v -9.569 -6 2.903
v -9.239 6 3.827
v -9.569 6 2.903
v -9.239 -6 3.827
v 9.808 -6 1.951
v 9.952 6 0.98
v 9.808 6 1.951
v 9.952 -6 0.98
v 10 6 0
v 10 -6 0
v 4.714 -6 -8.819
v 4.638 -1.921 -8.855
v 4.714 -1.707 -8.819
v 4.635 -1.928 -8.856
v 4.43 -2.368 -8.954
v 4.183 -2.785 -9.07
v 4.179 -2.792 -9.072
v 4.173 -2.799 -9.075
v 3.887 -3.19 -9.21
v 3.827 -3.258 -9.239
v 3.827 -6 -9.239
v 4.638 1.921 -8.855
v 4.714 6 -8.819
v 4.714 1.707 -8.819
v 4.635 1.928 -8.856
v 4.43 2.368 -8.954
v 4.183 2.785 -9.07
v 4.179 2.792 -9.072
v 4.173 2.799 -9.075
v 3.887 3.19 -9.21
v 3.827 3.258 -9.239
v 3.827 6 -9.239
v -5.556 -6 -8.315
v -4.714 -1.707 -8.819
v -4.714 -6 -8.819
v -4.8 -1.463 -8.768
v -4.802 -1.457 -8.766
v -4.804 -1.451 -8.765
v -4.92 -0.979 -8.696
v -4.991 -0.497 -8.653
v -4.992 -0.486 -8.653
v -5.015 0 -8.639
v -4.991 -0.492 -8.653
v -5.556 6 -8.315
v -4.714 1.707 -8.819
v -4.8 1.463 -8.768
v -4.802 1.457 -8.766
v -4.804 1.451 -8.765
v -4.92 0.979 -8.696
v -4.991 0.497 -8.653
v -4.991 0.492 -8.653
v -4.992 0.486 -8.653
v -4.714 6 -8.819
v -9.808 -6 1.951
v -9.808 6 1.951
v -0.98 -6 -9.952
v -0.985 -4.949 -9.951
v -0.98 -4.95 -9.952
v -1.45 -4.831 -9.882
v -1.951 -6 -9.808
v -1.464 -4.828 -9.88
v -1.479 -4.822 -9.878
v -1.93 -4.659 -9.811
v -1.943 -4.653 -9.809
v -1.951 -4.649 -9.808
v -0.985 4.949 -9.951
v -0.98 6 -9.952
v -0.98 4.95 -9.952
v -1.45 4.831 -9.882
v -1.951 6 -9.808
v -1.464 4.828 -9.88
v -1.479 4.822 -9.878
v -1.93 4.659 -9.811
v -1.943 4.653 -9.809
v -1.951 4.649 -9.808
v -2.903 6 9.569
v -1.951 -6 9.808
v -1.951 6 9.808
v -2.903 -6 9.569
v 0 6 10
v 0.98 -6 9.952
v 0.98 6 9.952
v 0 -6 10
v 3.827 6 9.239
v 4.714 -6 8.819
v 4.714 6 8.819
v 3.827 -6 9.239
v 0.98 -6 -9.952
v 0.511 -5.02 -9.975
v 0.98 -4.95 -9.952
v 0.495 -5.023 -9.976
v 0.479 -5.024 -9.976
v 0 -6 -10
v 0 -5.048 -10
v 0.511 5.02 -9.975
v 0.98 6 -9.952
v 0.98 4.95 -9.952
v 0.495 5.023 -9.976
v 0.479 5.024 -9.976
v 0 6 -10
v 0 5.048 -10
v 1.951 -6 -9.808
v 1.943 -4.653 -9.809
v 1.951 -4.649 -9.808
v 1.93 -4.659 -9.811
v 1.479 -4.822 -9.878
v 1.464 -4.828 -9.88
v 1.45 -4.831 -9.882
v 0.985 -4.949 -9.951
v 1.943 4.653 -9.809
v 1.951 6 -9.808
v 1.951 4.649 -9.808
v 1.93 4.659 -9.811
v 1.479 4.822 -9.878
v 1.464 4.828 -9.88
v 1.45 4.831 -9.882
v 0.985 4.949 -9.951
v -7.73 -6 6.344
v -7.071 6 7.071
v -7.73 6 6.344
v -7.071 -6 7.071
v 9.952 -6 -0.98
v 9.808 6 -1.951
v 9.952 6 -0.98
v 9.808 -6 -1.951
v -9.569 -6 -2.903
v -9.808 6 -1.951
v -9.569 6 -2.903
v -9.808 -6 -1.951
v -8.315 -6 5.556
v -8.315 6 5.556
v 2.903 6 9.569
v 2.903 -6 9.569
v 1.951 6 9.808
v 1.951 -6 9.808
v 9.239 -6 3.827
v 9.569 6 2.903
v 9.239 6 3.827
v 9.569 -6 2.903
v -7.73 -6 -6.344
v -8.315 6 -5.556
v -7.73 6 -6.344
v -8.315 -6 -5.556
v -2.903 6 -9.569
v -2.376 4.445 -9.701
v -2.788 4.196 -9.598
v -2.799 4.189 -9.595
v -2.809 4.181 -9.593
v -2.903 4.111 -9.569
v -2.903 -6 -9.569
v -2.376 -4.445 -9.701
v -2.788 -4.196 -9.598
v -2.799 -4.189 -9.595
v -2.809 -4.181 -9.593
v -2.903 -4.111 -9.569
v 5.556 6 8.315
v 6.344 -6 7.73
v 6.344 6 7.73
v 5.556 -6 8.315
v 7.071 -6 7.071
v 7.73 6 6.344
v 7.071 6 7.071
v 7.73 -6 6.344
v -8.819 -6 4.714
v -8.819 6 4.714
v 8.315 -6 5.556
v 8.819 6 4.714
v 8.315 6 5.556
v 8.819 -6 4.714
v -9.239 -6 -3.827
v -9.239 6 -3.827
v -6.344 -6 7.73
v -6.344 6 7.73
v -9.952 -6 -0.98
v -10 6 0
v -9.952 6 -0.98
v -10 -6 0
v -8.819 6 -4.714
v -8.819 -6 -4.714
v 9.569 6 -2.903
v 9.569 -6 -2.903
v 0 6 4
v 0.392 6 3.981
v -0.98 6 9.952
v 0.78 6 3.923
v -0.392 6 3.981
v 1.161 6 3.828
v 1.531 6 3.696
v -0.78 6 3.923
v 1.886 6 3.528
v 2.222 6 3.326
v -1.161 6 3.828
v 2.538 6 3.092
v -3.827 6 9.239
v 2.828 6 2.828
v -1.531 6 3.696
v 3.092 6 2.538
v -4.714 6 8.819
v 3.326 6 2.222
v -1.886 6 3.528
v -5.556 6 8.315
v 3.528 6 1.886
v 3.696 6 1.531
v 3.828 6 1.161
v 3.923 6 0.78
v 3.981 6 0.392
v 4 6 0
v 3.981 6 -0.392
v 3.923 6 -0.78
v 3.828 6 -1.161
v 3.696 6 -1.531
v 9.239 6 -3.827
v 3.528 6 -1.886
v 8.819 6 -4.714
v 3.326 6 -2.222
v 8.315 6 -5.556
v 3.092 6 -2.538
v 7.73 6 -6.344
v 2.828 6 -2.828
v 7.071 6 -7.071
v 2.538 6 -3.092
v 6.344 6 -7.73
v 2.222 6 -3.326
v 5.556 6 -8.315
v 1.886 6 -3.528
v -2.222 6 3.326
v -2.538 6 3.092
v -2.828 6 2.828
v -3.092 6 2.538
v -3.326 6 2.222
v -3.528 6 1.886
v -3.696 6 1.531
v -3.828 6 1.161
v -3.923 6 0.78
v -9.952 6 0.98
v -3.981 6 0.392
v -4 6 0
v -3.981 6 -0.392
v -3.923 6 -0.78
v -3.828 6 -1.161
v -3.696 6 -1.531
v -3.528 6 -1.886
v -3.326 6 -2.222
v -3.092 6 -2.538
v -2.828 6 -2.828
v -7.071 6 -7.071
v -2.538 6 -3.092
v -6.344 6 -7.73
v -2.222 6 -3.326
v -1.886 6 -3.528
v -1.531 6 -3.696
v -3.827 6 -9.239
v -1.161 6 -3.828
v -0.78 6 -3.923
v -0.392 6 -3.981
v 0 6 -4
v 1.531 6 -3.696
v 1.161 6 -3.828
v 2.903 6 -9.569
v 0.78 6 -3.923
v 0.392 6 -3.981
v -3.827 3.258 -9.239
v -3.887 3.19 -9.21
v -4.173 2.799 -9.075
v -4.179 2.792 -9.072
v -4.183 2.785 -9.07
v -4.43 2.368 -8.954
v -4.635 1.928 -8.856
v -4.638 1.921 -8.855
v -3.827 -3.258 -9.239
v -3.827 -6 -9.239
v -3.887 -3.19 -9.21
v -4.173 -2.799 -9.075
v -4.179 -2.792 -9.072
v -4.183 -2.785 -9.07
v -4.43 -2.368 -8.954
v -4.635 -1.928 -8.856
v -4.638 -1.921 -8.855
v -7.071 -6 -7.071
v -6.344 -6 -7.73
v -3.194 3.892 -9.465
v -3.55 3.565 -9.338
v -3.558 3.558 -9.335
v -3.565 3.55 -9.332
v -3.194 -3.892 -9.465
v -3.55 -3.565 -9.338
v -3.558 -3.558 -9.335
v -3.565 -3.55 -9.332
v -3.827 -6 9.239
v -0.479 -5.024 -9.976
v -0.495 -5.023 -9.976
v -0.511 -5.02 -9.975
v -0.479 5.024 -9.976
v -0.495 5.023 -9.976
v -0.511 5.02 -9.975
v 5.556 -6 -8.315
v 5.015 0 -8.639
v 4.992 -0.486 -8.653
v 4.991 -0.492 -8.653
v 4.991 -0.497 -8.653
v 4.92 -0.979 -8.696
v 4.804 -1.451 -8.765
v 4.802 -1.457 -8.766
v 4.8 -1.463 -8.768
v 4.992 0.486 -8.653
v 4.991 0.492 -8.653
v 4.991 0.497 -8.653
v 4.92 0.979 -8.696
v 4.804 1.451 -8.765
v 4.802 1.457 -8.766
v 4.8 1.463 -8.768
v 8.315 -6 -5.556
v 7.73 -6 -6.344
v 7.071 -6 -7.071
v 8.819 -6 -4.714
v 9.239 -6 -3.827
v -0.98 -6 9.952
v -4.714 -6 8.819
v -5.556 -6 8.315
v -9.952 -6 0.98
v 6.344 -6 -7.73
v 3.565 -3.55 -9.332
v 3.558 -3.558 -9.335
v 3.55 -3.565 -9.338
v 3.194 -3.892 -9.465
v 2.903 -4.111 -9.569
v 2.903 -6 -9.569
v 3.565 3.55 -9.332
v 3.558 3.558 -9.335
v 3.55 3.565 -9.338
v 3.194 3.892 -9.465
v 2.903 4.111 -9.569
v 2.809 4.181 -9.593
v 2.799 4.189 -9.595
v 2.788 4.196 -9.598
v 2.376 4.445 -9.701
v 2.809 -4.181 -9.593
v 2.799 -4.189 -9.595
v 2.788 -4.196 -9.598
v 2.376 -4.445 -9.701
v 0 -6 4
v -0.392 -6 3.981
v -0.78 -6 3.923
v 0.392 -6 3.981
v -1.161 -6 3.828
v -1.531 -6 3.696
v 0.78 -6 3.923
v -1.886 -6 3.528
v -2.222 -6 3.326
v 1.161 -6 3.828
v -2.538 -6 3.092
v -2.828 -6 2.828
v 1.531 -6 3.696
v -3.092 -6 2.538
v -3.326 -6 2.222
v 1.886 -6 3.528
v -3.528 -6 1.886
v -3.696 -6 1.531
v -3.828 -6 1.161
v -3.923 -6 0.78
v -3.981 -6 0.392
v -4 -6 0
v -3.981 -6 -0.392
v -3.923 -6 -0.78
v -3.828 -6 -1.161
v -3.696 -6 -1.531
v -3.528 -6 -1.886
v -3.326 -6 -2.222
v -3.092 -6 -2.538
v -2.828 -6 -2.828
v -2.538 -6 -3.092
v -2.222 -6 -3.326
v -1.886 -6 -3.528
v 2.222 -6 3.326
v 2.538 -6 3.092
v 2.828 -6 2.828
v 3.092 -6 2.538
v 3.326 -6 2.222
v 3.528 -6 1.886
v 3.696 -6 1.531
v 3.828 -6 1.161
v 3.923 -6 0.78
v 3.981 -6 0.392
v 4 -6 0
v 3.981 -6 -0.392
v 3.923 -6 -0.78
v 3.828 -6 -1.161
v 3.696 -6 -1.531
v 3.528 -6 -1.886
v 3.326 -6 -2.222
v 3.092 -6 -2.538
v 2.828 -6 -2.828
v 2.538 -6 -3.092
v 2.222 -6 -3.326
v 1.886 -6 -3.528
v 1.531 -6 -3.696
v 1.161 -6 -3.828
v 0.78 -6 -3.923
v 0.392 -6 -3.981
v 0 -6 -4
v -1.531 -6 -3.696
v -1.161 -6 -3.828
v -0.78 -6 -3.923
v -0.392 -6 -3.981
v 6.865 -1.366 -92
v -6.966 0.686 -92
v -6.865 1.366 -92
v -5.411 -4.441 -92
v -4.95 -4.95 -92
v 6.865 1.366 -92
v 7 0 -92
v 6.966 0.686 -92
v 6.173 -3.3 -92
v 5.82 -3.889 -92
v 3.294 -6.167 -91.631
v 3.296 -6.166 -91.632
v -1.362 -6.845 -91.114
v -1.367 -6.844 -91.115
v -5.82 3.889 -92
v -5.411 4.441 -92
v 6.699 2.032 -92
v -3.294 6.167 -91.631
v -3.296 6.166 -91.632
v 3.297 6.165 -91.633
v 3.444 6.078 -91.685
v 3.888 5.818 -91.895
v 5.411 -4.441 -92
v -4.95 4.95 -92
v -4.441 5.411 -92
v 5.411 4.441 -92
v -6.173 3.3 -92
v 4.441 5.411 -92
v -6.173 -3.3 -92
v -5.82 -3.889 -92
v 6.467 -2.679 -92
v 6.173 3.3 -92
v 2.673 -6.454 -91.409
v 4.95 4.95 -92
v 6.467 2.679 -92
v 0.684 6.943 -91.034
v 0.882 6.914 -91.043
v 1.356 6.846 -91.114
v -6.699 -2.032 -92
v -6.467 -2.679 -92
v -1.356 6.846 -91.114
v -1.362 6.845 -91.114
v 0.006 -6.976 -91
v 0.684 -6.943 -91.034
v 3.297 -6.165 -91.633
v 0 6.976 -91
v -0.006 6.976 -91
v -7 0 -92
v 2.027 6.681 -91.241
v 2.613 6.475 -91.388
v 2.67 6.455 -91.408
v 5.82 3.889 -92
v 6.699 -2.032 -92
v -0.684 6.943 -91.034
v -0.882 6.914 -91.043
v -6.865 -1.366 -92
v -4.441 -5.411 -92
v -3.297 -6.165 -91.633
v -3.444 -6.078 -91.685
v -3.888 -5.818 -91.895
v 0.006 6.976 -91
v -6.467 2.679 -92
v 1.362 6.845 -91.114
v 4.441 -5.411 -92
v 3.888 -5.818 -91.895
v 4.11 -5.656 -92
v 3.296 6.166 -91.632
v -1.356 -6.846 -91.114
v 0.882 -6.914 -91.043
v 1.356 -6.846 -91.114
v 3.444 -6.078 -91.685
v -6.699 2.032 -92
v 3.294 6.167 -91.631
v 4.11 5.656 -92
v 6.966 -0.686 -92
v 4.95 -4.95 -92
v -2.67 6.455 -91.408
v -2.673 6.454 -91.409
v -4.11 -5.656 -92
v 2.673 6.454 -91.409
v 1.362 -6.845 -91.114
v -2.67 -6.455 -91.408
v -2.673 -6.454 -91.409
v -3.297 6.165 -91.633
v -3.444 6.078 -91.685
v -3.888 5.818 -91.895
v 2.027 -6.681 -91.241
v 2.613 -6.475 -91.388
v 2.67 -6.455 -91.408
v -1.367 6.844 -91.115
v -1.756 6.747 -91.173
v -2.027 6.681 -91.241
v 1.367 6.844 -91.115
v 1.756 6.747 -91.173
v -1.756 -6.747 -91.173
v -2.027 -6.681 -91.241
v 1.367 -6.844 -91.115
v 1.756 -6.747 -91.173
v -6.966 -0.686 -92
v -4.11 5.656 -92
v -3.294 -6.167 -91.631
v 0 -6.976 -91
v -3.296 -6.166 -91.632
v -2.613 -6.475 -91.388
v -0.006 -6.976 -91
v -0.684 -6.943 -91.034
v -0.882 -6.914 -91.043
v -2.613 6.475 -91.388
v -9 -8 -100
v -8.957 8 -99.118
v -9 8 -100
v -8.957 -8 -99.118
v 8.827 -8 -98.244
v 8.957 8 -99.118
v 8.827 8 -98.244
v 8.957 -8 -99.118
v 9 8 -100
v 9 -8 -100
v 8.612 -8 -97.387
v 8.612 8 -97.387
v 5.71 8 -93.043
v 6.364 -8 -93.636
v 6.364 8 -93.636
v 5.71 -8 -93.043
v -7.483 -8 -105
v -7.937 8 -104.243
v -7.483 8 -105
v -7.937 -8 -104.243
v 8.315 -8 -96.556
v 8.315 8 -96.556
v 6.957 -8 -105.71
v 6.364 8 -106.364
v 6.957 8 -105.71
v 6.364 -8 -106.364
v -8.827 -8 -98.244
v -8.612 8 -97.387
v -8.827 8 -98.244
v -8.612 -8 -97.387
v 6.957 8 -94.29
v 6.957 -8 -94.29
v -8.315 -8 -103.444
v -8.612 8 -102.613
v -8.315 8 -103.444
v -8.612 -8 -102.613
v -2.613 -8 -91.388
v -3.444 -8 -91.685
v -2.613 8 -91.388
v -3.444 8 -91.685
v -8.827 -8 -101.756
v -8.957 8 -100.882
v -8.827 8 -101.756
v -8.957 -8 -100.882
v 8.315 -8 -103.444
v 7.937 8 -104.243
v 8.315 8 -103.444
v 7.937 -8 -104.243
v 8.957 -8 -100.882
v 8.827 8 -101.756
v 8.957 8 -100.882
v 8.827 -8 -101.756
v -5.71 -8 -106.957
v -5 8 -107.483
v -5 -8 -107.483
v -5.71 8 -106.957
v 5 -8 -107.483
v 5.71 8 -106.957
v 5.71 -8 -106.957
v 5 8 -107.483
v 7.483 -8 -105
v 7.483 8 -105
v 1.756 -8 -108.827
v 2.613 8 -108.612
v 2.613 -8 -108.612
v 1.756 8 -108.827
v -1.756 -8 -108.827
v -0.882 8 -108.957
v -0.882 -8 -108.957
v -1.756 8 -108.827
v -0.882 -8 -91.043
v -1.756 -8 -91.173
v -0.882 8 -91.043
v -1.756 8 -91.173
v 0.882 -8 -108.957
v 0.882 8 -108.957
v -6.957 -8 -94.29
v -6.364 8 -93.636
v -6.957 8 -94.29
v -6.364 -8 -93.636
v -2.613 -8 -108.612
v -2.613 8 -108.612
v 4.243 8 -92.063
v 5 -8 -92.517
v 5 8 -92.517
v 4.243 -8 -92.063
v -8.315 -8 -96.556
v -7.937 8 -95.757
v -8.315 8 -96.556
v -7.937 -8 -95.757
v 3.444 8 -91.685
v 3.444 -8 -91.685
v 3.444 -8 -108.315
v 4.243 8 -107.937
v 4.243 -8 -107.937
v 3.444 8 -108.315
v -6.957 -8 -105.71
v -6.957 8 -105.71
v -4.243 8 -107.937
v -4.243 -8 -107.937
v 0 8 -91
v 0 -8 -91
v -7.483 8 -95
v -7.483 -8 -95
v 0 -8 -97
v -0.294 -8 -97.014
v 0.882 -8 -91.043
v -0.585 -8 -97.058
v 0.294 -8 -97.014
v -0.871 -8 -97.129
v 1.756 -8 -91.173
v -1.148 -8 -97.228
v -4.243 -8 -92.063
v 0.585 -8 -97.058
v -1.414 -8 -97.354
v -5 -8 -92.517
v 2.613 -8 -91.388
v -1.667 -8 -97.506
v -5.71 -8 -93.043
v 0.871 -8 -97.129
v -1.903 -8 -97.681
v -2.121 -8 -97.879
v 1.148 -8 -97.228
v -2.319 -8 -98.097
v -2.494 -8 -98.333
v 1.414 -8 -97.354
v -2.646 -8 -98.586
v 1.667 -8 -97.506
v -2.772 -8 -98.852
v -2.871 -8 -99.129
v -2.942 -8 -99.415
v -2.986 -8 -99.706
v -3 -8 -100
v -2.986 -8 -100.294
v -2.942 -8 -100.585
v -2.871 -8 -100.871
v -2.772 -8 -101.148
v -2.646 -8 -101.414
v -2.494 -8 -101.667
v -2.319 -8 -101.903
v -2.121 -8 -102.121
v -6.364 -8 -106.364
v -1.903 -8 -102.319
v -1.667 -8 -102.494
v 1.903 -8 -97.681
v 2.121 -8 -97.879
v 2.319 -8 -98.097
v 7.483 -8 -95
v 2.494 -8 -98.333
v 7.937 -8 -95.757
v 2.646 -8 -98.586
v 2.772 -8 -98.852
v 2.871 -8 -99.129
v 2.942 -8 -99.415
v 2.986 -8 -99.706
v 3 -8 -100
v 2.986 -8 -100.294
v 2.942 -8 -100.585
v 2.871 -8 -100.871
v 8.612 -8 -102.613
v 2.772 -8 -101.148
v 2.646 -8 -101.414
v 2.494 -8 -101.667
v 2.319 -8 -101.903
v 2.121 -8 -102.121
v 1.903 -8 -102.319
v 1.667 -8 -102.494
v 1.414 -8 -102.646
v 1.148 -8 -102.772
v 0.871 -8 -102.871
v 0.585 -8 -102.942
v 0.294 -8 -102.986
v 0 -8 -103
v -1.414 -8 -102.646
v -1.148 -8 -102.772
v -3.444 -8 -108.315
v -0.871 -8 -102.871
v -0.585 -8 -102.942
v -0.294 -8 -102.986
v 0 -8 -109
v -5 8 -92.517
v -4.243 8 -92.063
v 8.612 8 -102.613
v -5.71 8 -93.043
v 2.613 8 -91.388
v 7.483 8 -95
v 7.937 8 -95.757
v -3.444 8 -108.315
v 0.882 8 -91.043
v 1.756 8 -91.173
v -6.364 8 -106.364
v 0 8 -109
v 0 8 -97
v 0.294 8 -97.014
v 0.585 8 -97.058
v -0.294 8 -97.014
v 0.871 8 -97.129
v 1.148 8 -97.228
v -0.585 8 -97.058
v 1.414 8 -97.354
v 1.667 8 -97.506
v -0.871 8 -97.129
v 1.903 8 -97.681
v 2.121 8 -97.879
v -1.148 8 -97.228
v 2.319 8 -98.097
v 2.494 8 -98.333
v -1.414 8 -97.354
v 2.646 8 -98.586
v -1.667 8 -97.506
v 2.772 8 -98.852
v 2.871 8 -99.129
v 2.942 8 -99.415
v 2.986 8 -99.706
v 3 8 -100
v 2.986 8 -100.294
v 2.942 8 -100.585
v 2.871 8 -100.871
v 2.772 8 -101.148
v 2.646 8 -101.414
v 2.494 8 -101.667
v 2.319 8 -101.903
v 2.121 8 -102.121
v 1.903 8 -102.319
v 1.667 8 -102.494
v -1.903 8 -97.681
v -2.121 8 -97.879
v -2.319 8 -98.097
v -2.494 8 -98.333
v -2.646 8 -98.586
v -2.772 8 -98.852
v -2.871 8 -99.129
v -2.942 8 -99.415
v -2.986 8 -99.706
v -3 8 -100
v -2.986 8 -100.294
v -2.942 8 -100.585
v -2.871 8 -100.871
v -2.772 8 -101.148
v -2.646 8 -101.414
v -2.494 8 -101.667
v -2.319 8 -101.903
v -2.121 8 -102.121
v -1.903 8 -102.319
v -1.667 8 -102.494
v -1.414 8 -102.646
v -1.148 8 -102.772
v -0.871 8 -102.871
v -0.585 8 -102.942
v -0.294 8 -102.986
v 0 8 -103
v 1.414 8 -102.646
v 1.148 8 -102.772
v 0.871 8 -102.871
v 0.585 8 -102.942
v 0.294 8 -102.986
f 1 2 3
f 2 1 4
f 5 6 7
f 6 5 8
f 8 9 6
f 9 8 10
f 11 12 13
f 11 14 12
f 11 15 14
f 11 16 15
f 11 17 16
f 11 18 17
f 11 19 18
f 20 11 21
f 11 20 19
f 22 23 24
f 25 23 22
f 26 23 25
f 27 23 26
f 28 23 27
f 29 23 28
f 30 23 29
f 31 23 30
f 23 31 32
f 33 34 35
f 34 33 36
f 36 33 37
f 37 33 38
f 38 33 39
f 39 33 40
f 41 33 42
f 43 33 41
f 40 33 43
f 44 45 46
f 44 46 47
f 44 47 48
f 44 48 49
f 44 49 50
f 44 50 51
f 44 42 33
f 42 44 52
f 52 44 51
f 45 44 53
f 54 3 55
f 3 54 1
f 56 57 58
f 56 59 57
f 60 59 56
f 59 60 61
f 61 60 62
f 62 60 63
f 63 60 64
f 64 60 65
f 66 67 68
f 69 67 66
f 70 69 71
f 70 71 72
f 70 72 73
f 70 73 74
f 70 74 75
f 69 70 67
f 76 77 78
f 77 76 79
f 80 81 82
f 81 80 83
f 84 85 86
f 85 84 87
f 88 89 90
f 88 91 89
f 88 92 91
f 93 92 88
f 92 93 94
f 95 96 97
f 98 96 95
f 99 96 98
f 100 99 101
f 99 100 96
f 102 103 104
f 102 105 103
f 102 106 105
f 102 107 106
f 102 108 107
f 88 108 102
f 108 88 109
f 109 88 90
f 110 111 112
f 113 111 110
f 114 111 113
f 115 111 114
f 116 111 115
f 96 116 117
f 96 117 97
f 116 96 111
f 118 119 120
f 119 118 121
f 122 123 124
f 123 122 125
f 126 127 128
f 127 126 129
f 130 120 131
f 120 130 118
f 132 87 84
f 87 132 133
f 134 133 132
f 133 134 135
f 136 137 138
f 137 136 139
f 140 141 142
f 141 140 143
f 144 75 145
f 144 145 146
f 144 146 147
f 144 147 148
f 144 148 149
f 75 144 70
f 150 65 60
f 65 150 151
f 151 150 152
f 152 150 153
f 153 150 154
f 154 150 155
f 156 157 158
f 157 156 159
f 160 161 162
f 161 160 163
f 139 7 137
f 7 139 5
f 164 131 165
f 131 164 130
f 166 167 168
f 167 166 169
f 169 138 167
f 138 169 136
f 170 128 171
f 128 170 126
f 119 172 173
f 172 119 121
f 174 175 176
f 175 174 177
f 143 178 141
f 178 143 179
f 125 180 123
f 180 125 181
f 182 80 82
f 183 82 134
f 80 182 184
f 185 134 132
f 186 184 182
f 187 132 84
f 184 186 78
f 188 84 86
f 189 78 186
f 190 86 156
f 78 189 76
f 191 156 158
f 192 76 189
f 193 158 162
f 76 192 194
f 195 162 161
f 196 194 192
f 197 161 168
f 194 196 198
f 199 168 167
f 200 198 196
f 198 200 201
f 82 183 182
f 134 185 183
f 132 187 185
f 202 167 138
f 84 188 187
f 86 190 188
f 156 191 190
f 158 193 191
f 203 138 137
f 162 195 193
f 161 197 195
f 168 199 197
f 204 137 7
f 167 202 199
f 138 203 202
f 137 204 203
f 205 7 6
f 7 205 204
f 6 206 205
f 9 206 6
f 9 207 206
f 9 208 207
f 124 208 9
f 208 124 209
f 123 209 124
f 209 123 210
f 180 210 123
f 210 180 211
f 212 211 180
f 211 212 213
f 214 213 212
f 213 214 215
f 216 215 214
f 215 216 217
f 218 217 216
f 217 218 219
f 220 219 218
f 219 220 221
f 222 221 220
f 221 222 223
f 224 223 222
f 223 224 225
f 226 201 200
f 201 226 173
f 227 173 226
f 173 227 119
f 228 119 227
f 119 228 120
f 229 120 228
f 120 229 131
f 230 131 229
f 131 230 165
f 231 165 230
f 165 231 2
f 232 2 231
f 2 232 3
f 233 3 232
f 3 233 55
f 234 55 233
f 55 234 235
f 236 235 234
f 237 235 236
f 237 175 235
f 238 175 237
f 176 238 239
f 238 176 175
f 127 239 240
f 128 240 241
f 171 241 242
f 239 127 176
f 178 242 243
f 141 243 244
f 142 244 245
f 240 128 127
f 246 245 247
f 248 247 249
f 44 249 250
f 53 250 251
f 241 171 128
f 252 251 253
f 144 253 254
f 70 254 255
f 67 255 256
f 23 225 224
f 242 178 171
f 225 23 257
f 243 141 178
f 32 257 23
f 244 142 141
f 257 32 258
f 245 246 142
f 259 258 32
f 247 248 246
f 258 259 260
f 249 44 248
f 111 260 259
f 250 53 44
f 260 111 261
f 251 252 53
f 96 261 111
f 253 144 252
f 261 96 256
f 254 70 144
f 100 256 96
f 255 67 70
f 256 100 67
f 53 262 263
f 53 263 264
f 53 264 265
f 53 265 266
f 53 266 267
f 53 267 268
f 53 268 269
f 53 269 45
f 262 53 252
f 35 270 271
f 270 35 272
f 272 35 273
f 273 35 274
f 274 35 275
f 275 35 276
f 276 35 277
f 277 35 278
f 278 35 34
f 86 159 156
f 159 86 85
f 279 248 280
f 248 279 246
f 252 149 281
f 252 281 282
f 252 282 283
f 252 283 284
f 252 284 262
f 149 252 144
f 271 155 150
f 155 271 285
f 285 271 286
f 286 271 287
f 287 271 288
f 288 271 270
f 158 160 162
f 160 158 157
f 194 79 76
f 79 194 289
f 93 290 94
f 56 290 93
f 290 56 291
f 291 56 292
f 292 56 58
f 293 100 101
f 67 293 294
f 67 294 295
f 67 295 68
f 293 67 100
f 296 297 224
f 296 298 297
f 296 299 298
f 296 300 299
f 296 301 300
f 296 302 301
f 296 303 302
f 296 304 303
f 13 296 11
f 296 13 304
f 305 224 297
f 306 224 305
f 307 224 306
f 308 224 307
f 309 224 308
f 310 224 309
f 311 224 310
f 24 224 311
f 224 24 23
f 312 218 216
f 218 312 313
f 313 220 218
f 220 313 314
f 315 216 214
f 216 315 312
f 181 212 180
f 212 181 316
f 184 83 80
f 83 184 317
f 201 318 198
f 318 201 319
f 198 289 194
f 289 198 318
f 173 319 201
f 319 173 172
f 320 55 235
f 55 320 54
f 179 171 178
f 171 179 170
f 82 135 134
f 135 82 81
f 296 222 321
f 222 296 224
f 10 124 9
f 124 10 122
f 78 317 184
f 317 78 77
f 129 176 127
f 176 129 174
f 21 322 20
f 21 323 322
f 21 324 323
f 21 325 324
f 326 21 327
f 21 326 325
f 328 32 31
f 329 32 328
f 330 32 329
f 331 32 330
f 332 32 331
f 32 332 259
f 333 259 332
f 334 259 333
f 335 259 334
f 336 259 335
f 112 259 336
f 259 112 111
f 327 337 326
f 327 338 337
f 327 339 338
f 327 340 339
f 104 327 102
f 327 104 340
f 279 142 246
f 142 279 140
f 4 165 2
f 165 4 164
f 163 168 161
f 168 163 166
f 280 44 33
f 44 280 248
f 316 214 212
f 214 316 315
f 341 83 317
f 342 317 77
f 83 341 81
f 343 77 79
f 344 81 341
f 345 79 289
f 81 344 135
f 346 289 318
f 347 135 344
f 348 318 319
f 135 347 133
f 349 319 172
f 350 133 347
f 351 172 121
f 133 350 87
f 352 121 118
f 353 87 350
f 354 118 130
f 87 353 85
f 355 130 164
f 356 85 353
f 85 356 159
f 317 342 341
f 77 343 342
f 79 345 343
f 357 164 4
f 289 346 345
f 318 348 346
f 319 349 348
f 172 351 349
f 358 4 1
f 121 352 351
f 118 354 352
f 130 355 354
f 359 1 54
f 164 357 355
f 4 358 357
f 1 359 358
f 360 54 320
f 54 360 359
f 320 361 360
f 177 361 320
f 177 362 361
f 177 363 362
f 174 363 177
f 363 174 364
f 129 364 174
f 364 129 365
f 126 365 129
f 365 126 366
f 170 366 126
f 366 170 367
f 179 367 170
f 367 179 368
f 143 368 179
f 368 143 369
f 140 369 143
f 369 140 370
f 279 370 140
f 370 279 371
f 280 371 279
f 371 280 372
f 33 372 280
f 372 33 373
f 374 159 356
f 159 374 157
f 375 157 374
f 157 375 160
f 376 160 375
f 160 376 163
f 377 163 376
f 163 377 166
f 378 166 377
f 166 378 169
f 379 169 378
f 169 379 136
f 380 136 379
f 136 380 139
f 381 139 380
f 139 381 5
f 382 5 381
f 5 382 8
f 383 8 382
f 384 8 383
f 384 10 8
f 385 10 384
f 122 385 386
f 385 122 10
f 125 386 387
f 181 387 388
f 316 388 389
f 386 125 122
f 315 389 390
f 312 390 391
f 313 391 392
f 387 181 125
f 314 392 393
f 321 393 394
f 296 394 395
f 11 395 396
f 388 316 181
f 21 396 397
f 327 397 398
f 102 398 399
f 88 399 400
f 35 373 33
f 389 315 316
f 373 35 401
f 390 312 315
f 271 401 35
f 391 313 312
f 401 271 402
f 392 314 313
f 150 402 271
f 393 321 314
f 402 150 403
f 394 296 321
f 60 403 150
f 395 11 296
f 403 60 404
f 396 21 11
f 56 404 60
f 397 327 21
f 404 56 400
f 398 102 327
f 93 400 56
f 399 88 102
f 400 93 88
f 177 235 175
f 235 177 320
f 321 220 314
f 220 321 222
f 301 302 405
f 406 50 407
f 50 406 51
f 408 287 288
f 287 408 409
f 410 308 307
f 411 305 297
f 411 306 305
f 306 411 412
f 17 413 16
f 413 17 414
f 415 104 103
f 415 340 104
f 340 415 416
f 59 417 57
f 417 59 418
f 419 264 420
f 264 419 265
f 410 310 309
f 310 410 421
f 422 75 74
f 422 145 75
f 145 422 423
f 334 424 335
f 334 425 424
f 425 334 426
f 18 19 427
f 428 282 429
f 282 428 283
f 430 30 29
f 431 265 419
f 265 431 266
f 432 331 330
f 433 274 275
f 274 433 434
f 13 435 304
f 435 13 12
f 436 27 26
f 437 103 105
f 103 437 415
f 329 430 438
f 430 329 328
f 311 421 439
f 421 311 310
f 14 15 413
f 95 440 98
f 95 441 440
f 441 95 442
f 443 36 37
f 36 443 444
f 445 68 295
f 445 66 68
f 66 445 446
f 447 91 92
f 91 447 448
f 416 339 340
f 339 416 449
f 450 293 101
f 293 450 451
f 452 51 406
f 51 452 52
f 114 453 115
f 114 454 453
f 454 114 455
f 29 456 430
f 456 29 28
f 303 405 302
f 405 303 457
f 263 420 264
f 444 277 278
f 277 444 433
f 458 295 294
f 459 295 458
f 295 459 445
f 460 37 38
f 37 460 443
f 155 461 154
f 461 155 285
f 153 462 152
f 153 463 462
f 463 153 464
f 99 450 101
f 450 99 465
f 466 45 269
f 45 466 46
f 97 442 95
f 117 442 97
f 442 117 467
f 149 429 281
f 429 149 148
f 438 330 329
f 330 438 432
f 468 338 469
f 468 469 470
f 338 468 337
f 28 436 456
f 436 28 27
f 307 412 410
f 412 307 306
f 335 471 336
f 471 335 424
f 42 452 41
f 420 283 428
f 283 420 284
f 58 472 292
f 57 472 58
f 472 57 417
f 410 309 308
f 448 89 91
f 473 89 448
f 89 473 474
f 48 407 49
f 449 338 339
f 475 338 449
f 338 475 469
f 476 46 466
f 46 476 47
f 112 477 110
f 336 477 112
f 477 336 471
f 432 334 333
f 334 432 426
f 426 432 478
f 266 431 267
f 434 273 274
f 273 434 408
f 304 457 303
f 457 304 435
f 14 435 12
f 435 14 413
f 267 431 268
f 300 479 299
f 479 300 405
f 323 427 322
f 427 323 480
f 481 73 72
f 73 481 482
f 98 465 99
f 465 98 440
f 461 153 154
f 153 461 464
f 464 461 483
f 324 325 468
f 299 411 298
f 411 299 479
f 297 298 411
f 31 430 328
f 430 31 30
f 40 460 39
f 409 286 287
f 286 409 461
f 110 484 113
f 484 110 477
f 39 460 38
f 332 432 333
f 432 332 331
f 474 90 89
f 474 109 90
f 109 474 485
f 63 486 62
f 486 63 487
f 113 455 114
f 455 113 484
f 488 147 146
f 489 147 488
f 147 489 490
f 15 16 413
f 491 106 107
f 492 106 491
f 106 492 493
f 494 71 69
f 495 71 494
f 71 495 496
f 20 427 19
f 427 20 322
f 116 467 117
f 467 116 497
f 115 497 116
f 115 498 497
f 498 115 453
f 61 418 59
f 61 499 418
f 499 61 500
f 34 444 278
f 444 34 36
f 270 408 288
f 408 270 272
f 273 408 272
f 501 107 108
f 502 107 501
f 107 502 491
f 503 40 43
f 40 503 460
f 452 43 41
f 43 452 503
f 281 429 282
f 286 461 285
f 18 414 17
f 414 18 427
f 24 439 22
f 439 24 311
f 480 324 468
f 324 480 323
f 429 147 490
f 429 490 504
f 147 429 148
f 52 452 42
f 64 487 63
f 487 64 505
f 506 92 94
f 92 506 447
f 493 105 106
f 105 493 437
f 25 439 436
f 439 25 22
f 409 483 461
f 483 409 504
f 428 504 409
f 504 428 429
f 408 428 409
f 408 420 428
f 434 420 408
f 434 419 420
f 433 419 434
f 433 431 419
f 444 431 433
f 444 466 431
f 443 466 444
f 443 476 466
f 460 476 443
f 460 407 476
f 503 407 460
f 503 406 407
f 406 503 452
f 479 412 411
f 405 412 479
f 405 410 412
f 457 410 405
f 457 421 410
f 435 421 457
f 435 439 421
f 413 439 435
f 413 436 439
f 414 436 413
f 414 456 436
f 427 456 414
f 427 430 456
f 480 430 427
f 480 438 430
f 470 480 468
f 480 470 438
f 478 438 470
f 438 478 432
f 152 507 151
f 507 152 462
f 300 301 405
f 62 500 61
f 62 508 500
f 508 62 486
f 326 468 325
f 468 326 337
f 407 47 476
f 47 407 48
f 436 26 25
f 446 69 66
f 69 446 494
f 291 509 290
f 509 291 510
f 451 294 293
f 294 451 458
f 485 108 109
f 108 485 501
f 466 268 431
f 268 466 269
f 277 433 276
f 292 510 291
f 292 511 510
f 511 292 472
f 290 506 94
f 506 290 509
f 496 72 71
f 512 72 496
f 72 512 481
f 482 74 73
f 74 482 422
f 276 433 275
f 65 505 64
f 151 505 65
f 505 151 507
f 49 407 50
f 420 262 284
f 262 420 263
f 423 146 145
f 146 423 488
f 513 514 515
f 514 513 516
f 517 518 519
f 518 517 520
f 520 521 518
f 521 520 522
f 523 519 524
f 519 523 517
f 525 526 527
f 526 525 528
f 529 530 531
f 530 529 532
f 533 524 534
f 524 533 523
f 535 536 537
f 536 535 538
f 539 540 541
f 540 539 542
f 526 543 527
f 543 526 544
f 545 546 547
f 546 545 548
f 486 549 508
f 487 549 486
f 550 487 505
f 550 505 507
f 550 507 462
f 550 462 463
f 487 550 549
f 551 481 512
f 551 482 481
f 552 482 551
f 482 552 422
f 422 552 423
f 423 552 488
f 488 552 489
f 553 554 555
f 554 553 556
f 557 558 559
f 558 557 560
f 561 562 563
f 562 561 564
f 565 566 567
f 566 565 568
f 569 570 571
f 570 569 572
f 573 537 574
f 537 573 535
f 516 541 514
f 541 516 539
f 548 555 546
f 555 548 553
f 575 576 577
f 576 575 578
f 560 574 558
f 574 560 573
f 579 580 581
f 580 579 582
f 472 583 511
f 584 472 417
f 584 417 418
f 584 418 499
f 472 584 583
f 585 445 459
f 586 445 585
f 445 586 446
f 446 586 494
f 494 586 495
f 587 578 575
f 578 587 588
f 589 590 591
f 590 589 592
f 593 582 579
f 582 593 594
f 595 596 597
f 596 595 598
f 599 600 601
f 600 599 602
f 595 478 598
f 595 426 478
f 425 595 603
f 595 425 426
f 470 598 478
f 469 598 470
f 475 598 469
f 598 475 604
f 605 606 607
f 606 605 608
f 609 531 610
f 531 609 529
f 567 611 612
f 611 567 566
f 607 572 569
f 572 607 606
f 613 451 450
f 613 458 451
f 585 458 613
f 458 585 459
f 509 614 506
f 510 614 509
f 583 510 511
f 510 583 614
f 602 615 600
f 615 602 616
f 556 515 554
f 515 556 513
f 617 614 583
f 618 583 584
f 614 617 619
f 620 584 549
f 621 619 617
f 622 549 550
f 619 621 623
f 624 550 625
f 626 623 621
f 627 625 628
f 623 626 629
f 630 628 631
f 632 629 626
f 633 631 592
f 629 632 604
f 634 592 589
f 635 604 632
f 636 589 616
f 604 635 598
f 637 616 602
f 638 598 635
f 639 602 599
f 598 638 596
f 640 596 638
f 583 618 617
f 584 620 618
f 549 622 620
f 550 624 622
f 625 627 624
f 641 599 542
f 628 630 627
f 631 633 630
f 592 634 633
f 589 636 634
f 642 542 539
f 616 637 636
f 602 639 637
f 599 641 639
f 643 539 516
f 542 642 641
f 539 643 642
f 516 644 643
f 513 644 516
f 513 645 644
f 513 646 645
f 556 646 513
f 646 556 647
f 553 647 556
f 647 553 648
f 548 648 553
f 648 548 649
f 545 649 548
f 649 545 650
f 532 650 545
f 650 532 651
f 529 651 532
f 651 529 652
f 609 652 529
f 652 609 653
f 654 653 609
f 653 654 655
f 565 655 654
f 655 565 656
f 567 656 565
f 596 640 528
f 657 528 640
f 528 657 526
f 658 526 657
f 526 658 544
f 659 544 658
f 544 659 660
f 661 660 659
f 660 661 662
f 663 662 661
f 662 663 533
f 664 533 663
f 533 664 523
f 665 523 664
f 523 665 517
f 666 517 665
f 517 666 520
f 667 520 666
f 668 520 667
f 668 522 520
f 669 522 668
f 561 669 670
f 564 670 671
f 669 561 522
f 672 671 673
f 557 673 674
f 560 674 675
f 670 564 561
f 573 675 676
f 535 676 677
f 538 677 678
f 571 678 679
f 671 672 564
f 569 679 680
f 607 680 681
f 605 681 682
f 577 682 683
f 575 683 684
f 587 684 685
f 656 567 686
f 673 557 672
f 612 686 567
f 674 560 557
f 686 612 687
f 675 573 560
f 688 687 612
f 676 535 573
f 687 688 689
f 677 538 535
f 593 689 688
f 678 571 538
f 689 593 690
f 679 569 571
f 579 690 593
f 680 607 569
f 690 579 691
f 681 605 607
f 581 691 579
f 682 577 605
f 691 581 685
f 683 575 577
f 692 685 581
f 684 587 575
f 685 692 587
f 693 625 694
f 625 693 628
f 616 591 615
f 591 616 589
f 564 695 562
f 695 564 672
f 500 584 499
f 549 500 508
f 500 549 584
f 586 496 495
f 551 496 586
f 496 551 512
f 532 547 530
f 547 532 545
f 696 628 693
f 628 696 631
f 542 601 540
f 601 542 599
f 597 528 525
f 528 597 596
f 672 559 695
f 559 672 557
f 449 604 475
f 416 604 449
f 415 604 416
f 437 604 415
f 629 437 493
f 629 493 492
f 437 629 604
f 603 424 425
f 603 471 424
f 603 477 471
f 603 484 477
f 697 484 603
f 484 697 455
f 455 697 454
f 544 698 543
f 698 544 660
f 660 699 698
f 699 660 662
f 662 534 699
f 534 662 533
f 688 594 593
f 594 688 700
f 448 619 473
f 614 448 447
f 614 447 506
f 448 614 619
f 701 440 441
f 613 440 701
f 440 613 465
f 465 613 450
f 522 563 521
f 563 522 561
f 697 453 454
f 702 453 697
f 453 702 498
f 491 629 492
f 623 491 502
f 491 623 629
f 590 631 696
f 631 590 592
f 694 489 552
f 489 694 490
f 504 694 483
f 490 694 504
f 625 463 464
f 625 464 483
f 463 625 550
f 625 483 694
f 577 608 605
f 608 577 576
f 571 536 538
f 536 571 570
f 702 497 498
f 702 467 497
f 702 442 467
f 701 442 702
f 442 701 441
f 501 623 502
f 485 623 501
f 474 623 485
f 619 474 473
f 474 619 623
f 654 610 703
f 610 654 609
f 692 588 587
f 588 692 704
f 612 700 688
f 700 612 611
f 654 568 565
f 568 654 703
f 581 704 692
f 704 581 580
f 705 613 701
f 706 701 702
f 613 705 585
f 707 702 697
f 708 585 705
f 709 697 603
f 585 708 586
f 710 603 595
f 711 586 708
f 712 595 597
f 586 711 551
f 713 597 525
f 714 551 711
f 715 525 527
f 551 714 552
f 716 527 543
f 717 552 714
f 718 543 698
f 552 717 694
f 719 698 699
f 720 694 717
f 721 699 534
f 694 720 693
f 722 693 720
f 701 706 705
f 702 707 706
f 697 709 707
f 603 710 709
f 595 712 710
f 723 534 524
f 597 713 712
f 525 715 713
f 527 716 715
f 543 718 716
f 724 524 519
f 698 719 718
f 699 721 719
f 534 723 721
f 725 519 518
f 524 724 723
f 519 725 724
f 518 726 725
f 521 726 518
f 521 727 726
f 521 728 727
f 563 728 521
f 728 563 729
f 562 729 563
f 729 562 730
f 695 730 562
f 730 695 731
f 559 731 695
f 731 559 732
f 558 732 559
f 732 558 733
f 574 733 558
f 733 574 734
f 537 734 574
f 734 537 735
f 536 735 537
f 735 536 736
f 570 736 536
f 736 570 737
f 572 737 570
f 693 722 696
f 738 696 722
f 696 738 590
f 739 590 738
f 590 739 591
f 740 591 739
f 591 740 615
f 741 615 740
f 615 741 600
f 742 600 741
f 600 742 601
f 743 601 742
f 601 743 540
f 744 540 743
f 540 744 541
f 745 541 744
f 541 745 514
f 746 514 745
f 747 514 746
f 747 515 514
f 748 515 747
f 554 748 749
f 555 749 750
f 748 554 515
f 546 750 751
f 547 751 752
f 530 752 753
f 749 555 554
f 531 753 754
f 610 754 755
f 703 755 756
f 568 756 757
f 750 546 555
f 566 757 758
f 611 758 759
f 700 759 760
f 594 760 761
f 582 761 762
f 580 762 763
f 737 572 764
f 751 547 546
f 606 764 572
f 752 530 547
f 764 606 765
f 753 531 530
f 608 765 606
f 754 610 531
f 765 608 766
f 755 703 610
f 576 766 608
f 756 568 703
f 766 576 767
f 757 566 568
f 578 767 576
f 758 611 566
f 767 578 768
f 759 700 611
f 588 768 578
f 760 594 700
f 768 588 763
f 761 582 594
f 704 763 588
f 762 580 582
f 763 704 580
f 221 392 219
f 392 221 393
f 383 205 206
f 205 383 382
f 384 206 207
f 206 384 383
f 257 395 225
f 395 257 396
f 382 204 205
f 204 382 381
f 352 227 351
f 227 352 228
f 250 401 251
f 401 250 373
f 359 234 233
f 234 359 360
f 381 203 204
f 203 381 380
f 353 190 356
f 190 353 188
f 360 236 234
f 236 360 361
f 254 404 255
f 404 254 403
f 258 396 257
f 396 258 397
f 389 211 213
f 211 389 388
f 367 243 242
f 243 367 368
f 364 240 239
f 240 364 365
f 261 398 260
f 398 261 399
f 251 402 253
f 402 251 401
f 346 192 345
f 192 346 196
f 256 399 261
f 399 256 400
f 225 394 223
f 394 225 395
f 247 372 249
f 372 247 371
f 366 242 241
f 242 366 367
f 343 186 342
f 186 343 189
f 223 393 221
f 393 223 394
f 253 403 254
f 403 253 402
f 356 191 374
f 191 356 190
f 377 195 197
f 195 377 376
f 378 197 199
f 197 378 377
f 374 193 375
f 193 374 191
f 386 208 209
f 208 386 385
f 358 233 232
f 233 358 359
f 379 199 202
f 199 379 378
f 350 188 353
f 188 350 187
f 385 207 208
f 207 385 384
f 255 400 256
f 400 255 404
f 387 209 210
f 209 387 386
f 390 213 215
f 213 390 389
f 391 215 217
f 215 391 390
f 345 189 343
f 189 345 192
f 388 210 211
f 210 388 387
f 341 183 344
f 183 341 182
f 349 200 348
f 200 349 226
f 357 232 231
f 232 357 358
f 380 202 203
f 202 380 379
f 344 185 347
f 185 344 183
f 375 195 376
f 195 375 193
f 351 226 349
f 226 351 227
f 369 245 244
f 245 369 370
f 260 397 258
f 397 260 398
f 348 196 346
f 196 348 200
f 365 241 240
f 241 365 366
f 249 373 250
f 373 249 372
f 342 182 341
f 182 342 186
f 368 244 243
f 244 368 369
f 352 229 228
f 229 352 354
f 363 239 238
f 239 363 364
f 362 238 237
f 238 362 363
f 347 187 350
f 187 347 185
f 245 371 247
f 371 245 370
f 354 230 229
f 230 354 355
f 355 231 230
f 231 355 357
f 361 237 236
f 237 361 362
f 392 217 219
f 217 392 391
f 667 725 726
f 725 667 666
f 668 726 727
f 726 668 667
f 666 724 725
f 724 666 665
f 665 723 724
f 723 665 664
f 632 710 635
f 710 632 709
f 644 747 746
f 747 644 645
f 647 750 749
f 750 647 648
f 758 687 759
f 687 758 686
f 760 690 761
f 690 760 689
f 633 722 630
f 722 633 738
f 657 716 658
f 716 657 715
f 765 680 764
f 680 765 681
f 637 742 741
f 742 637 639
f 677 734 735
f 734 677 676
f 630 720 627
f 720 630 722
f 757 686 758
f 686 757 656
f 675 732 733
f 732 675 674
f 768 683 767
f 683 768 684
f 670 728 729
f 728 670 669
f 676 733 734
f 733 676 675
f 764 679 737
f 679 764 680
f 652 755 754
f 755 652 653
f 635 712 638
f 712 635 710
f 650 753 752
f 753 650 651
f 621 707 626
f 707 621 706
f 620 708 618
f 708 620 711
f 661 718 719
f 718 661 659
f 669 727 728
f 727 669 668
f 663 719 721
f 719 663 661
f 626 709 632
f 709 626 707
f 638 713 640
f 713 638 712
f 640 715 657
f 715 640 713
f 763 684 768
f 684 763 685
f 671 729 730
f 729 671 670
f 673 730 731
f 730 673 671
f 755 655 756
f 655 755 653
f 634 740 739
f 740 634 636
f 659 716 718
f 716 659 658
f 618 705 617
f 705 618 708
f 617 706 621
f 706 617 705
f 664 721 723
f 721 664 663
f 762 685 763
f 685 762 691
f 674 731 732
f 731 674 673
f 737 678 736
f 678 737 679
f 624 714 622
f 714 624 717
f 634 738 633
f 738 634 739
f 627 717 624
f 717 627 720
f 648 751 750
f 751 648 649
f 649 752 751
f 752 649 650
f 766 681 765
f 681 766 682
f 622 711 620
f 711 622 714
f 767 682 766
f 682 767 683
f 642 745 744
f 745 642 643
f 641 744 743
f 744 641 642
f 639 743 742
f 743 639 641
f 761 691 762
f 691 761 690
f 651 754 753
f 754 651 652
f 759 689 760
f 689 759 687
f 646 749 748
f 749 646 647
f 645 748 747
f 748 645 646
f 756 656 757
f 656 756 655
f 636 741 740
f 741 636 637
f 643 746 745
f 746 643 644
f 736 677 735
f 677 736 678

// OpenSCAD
// file: params.scad
$fn = 64;

femur_length_mm = 110;
tibia_length_mm = 100;

hip_hub_width_mm = 22;
hip_hub_radius_mm = 11;
hip_pin_dia_mm = 6;

femur_shaft_prox_dia_mm = 20;
femur_shaft_dist_dia_mm = 16;
femur_prox_offset_mm = 8;
femur_dist_offset_mm = 10;
femur_bridge_height_mm = 8;

knee_fork_gap_mm = 12;
knee_fork_plate_mm = 6;
knee_hub_radius_mm = 13;
knee_pin_dia_mm = 8;

tibia_hub_radius_mm = 10;
tibia_shaft_prox_dia_mm = 14;
tibia_shaft_dist_dia_mm = 10;
tibia_prox_offset_mm = 8;
tibia_dist_offset_mm = 8;

ankle_hub_radius_mm = 9;
ankle_hub_width_mm = 16;
ankle_pin_dia_mm = 6;

knee_angle_deg = 25;
hip_angle_deg = 0;
ankle_angle_deg = -(hip_angle_deg + knee_angle_deg);

hip_base_gap_mm = hip_hub_width_mm;
hip_base_plate_mm = 6;
hip_base_radius_mm = 15;
hip_base_tower_top_mm = 34;
hip_base_tower_width_x_mm = 26;
hip_base_mount_size_x_mm = 70;
hip_base_mount_size_y_mm = 50;
hip_base_mount_thickness_mm = 8;
hip_base_bolt_dia_mm = 6;

foot_plate_mm = 5;
foot_fork_radius_mm = 11;
foot_column_width_x_mm = 24;
foot_column_top_mm = -ankle_hub_radius_mm;
foot_column_bottom_mm = -19;
foot_sole_top_mm = -18;
foot_sole_length_mm = 85;
foot_sole_width_mm = 34;
foot_sole_thickness_mm = 8;
foot_sole_center_x_mm = 27.5;
// main file
include <params.scad>

module tibia() {
    difference() {
        union() {
            rotate([90, 0, 0])
                cylinder(h = knee_fork_gap_mm, d = 2 * tibia_hub_radius_mm, center = true);

            translate([0, 0, -(tibia_length_mm - tibia_dist_offset_mm)])
                cylinder(
                    h = tibia_length_mm - tibia_prox_offset_mm - tibia_dist_offset_mm,
                    d1 = tibia_shaft_prox_dia_mm,
                    d2 = tibia_shaft_dist_dia_mm
                );

            translate([0, 0, -tibia_length_mm])
                rotate([90, 0, 0])
                    cylinder(h = ankle_hub_width_mm, d = 2 * ankle_hub_radius_mm, center = true);
        }

        rotate([90, 0, 0])
            cylinder(h = knee_fork_gap_mm + 2, d = knee_pin_dia_mm, center = true);

        translate([0, 0, -tibia_length_mm])
            rotate([90, 0, 0])
                cylinder(h = ankle_hub_width_mm + 2, d = ankle_pin_dia_mm, center = true);
    }
}

tibia();
